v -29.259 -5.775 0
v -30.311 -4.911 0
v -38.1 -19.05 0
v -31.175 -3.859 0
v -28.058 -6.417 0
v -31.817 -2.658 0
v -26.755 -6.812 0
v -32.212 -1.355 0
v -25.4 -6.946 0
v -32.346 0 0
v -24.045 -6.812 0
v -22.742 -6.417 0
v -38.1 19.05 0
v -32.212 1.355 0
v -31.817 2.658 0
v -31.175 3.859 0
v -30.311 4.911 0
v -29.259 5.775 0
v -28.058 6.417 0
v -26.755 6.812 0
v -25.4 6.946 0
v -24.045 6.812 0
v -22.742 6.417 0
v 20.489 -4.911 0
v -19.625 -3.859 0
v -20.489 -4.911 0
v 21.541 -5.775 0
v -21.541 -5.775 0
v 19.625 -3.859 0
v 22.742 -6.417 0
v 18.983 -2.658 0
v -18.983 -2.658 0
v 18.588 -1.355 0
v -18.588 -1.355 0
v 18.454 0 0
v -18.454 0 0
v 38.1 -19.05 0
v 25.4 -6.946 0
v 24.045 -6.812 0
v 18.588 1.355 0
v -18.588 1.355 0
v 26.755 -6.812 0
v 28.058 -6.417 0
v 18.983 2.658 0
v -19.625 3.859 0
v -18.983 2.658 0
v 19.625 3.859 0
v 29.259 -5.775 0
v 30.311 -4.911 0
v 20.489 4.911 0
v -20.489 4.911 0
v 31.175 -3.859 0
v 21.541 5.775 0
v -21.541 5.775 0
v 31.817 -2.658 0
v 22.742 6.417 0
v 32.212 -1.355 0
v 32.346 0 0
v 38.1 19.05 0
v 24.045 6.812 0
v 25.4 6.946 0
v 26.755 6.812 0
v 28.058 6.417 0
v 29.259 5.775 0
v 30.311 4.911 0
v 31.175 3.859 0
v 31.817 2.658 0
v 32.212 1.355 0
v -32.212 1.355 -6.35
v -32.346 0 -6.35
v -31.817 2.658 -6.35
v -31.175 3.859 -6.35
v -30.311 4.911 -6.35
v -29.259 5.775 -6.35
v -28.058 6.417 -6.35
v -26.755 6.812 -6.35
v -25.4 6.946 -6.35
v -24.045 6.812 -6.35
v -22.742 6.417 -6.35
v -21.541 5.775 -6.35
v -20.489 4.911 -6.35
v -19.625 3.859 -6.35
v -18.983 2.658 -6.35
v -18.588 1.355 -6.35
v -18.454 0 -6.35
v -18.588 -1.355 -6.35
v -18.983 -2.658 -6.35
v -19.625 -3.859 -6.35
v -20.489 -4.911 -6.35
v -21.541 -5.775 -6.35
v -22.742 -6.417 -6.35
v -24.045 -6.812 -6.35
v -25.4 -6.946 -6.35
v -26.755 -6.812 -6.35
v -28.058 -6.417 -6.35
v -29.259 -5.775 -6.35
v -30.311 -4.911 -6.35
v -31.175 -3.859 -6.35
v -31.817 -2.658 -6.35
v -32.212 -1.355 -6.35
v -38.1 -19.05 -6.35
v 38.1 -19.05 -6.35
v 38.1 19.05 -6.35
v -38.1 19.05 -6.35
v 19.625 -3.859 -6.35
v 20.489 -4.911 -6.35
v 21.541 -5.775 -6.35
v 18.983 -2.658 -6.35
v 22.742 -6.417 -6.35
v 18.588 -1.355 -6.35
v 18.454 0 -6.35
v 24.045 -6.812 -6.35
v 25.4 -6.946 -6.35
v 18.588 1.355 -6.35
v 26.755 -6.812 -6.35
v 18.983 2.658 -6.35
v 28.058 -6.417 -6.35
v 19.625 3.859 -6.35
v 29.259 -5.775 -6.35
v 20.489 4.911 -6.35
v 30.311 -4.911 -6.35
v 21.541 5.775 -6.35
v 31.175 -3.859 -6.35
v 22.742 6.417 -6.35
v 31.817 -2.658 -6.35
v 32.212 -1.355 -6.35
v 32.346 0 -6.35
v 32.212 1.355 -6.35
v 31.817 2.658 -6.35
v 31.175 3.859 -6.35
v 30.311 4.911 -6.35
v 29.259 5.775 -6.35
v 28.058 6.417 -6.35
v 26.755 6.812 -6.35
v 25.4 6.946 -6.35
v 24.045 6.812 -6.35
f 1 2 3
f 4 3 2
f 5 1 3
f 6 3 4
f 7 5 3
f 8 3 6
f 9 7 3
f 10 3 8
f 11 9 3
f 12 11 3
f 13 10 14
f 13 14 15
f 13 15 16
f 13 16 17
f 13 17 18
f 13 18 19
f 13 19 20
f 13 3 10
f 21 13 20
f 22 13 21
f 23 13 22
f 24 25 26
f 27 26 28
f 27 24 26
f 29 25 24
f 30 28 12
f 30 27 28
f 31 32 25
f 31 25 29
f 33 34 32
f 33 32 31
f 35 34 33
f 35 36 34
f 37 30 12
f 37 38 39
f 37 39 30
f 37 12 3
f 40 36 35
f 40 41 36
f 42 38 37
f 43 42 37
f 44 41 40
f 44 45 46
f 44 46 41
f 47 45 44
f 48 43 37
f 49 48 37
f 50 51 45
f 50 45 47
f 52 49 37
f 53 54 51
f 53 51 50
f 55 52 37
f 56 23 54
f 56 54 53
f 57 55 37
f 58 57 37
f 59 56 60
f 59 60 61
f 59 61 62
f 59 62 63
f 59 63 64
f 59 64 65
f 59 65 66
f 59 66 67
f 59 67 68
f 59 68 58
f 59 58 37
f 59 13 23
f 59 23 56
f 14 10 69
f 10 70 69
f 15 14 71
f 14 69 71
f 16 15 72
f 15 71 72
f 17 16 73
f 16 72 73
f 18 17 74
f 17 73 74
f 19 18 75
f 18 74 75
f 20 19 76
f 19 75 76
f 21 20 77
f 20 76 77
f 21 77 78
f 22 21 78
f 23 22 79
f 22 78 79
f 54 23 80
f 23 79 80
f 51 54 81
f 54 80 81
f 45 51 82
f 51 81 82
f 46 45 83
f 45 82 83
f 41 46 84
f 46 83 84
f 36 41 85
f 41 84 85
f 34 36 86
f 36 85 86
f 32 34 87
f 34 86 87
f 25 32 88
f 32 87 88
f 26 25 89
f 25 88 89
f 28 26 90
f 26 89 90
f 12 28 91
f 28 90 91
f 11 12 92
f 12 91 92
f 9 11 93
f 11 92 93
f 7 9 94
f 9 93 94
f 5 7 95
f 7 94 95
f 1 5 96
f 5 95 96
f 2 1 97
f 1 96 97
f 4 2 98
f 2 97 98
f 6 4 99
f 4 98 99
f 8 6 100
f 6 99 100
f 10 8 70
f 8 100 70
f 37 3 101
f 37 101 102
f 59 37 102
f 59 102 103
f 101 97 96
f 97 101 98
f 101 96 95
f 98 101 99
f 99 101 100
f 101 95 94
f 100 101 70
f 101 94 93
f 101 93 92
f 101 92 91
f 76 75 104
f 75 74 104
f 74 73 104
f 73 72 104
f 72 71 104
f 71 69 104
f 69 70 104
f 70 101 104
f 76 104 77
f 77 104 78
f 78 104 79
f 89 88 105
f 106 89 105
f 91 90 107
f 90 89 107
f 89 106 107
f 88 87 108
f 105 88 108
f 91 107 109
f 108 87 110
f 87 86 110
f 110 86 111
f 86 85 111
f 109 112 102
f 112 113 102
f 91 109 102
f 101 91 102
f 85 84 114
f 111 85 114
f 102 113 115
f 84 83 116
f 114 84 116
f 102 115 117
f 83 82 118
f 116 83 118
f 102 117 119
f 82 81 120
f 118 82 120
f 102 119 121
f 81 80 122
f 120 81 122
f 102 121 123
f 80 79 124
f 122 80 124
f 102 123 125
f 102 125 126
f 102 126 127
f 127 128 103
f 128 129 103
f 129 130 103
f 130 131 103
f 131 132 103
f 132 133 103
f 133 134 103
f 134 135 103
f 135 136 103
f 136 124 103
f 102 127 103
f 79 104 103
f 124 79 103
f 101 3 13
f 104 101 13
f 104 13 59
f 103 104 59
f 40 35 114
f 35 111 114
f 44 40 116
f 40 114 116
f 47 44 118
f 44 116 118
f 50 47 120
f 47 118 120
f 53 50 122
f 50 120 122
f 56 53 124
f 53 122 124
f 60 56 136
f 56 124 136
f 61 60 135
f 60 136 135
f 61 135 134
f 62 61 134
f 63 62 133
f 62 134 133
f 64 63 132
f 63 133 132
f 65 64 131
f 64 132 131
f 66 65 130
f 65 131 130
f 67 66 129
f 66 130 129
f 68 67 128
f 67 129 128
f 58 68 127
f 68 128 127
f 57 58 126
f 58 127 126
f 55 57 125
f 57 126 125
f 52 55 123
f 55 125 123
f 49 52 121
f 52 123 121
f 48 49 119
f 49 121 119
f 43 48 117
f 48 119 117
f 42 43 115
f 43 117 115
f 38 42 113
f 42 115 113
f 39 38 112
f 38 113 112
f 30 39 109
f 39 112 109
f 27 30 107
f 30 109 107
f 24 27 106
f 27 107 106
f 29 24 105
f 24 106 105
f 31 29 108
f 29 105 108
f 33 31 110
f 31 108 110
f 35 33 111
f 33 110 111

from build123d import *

# Parameters (mm, degrees)
SKETCH1_W                   = 76.2
SKETCH1_H                   = 38.1
EXTRUDE1_DEPTH              = 6.35
F_1_2_CLEARANCE_HOLE1_D     = 13.89126
F_1_2_CLEARANCE_HOLE1_DEPTH = 6.35
F_1_2_CLEARANCE_HOLE1_TIP   = 4.173355541


with BuildPart() as part:
    # Sketch1 → Extrude1 (new body)
    with BuildSketch(Plane.XY):
        Rectangle(SKETCH1_W, SKETCH1_H)
    extrude(amount=-EXTRUDE1_DEPTH)

    # 1/2 Clearance Hole1
    with Locations(Plane.XY):
        with Locations((-25.4, 0), (25.4, 0)):
            Hole(F_1_2_CLEARANCE_HOLE1_D / 2, depth=F_1_2_CLEARANCE_HOLE1_DEPTH)
            with Locations((0, 0, -(F_1_2_CLEARANCE_HOLE1_DEPTH + F_1_2_CLEARANCE_HOLE1_TIP / 2))):  # 118° drill point
                Cone(0, F_1_2_CLEARANCE_HOLE1_D / 2, F_1_2_CLEARANCE_HOLE1_TIP, mode=Mode.SUBTRACT)


solid = part.part
